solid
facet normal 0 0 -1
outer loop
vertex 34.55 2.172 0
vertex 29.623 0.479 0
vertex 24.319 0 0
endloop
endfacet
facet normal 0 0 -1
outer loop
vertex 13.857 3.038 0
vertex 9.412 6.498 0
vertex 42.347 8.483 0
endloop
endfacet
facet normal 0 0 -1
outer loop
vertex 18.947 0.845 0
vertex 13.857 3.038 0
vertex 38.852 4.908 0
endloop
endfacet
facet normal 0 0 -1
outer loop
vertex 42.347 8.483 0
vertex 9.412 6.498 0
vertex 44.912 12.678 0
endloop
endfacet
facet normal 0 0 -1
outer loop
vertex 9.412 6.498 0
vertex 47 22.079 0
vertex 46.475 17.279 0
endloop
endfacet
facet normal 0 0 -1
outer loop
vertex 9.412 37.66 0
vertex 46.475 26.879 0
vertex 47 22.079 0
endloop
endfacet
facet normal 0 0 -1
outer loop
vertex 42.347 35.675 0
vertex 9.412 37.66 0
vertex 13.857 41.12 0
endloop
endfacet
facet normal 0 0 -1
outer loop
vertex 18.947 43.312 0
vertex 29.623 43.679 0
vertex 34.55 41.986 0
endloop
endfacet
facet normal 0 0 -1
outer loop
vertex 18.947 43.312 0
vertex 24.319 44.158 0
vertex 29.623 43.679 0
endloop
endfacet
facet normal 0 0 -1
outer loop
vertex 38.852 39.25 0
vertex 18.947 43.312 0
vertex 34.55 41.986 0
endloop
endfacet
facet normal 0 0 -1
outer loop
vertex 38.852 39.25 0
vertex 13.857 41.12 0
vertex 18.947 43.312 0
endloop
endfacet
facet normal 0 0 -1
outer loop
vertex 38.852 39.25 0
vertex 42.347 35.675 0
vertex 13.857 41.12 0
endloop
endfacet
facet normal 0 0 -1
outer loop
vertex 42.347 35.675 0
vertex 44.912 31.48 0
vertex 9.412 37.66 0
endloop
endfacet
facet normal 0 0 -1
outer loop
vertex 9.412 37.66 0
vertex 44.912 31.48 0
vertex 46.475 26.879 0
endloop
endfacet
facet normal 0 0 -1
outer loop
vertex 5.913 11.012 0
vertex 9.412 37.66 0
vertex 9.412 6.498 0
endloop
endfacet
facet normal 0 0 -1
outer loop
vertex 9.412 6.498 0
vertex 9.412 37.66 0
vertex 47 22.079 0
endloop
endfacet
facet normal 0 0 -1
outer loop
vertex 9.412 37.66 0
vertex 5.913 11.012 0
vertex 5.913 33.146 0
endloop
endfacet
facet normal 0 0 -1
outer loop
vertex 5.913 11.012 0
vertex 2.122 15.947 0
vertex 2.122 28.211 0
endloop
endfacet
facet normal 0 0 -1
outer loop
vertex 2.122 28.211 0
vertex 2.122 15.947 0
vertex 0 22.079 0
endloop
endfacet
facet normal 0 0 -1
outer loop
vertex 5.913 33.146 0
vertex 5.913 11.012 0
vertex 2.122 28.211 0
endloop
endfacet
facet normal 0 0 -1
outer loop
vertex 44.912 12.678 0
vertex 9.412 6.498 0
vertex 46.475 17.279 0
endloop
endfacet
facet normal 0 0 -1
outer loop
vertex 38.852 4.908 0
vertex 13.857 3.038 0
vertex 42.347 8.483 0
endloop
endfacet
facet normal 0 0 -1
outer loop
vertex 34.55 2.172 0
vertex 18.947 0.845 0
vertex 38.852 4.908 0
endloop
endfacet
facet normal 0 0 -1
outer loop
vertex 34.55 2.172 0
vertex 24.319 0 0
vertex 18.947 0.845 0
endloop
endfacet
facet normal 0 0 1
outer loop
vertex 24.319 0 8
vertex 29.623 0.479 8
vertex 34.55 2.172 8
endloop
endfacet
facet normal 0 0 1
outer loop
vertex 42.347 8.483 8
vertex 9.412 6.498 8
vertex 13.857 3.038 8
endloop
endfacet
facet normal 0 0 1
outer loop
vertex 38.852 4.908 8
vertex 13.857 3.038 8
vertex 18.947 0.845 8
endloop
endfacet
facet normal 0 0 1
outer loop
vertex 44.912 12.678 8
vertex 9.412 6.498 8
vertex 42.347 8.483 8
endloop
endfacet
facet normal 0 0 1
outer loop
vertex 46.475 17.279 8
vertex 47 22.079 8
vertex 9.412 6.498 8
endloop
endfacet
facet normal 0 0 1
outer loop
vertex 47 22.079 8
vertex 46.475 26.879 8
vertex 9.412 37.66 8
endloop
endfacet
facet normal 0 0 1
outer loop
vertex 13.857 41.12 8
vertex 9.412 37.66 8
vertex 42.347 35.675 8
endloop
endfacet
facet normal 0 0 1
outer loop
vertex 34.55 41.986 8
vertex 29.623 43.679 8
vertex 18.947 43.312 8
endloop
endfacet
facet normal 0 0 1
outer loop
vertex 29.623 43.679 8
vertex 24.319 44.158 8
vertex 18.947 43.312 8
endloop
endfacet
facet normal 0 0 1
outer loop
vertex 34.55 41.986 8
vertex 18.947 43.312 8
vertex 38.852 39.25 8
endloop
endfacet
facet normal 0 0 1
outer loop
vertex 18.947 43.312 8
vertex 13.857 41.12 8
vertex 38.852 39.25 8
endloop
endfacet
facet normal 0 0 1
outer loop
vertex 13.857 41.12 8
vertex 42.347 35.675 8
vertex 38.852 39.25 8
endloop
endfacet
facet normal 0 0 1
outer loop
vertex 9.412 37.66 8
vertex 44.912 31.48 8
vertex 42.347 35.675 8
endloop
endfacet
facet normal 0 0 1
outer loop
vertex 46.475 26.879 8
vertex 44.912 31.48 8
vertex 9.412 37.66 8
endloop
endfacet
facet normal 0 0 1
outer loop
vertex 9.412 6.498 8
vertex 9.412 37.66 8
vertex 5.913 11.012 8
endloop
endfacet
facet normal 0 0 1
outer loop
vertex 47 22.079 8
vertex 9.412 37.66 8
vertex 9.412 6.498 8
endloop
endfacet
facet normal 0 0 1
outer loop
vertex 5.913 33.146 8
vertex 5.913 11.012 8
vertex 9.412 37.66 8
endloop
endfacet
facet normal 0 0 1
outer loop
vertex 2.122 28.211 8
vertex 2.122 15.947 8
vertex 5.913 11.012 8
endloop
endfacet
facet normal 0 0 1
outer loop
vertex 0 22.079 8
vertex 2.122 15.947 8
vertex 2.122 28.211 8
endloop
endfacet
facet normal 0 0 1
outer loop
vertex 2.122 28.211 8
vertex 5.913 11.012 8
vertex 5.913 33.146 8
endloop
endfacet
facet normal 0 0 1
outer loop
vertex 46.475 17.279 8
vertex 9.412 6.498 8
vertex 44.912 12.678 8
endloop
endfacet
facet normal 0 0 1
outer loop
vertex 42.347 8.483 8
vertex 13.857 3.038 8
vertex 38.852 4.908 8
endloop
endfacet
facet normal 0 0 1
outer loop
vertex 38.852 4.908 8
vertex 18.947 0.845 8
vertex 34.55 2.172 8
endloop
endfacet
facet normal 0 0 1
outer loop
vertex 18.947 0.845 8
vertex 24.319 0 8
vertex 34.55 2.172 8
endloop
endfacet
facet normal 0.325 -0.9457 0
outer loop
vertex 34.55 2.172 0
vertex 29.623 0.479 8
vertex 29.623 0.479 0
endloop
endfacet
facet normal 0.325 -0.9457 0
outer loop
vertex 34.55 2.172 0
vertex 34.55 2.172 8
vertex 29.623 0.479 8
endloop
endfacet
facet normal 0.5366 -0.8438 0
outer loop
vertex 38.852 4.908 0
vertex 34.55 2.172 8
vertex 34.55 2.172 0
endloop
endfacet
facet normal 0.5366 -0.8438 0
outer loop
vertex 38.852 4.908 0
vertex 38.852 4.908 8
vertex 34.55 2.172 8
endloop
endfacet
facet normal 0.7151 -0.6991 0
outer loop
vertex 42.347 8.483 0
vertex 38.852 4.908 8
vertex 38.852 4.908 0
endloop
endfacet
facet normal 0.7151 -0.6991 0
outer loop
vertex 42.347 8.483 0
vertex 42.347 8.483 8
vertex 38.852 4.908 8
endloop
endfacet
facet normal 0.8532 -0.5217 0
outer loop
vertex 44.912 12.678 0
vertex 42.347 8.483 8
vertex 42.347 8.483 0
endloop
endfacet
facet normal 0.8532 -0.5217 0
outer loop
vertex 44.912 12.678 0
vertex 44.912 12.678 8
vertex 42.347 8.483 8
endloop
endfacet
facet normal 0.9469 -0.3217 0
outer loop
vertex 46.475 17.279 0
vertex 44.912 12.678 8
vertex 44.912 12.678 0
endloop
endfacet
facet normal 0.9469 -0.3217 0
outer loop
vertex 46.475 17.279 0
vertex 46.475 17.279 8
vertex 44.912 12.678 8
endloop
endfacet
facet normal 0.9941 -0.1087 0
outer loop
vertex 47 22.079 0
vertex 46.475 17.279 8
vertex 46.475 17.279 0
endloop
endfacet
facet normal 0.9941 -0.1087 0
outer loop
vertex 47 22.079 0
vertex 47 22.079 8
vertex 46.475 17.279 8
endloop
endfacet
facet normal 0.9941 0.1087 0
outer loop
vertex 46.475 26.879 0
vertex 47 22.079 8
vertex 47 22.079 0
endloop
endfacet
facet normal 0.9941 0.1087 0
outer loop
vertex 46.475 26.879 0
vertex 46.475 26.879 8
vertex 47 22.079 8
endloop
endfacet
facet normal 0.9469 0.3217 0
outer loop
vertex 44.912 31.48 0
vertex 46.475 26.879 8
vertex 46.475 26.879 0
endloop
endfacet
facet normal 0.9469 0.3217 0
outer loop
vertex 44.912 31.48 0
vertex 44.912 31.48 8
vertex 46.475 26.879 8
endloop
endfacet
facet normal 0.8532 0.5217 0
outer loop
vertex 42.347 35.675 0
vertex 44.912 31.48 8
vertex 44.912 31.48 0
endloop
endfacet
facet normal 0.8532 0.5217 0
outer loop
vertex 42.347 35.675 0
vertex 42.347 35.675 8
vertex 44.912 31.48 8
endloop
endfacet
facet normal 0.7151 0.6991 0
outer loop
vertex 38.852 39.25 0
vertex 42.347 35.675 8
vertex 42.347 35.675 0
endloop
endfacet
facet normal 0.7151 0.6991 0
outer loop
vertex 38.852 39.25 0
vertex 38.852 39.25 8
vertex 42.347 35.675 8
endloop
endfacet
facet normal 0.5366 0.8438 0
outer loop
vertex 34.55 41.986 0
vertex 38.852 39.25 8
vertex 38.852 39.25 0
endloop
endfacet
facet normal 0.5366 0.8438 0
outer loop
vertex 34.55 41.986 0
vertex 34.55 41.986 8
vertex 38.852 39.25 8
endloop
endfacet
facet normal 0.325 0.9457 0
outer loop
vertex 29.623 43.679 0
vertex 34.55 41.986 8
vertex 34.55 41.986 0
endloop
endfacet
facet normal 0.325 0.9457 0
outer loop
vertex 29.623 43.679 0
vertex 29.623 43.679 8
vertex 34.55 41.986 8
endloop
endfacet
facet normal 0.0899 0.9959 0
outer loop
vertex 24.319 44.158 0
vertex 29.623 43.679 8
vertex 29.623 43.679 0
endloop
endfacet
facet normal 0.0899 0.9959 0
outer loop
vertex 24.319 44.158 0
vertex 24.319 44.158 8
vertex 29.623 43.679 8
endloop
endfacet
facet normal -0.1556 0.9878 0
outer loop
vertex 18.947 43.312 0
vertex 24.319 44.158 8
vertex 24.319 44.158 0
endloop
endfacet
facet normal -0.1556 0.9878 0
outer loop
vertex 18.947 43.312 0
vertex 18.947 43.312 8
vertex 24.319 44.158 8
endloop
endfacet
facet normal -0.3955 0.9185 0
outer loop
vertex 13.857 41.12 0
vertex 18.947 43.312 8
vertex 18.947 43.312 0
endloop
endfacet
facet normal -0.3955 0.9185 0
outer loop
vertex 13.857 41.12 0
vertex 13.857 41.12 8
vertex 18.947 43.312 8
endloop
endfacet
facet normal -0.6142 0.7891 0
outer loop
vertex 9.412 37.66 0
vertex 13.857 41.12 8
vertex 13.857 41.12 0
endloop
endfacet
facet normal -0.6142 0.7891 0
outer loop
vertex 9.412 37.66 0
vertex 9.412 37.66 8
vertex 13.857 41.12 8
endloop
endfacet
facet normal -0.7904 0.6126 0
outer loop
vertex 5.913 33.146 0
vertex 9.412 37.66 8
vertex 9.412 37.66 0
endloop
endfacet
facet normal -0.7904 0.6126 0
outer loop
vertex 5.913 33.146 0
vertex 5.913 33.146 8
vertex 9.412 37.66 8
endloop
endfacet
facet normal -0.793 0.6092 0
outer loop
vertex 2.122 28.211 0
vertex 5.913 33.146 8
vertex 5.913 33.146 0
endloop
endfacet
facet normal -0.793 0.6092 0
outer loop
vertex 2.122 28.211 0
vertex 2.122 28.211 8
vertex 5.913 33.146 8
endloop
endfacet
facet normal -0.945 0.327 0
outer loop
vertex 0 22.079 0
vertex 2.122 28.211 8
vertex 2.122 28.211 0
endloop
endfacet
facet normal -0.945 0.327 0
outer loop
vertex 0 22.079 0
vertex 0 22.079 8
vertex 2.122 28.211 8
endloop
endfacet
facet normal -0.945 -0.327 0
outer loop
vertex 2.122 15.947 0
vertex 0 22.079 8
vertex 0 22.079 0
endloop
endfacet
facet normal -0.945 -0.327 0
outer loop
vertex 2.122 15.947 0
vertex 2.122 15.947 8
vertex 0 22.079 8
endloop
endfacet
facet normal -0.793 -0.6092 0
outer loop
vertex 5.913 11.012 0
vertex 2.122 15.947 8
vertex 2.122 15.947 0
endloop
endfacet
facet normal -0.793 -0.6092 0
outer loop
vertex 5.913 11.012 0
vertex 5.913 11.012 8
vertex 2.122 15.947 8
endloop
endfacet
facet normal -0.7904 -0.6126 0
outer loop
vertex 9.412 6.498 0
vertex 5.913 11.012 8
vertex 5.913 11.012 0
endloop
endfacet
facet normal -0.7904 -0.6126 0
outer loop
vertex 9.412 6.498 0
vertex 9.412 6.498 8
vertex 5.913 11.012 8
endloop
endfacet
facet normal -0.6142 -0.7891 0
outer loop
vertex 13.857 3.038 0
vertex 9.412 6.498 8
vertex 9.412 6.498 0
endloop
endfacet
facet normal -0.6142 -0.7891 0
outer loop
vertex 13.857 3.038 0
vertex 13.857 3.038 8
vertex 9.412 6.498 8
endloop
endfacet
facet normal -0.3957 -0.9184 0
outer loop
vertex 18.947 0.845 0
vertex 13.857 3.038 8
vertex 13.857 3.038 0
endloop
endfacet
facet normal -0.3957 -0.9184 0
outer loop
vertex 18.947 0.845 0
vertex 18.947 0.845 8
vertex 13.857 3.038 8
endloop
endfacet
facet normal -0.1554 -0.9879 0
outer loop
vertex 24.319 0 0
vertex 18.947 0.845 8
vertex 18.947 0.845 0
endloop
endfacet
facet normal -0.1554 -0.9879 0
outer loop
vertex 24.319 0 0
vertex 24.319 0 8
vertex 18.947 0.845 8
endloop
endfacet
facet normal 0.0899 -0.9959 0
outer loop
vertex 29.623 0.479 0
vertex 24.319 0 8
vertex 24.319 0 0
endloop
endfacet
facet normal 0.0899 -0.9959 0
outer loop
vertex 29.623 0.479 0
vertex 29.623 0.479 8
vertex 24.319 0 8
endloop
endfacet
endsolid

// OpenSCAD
$fn = 32;

// ----------------------------------------------------------------------
// Cam disc: base radius 20.0 mm, lift 4.0 mm, 26 profile points
// ----------------------------------------------------------------------

// --- parameters (mm) ---
profile_height = 8;       // extrusion height
profile_points = 26;      // points of the closed outline

profile = [[47, 22.079], [46.475, 26.879], [44.912, 31.48], [42.347, 35.675], [38.852, 39.25], [34.55, 41.986], [29.623, 43.679], [24.319, 44.158], [18.947, 43.312], [13.857, 41.12], [9.412, 37.66], [5.913, 33.146], [2.122, 28.211], [0, 22.079], [2.122, 15.947], [5.913, 11.012], [9.412, 6.498], [13.857, 3.038], [18.947, 0.845], [24.319, 0], [29.623, 0.479], [34.55, 2.172], [38.852, 4.908], [42.347, 8.483], [44.912, 12.678], [46.475, 17.279]];  // single closed polygon, 26 points, counter clockwise

// --- the one profile operation ---
linear_extrude(height = profile_height) polygon(points = profile);
